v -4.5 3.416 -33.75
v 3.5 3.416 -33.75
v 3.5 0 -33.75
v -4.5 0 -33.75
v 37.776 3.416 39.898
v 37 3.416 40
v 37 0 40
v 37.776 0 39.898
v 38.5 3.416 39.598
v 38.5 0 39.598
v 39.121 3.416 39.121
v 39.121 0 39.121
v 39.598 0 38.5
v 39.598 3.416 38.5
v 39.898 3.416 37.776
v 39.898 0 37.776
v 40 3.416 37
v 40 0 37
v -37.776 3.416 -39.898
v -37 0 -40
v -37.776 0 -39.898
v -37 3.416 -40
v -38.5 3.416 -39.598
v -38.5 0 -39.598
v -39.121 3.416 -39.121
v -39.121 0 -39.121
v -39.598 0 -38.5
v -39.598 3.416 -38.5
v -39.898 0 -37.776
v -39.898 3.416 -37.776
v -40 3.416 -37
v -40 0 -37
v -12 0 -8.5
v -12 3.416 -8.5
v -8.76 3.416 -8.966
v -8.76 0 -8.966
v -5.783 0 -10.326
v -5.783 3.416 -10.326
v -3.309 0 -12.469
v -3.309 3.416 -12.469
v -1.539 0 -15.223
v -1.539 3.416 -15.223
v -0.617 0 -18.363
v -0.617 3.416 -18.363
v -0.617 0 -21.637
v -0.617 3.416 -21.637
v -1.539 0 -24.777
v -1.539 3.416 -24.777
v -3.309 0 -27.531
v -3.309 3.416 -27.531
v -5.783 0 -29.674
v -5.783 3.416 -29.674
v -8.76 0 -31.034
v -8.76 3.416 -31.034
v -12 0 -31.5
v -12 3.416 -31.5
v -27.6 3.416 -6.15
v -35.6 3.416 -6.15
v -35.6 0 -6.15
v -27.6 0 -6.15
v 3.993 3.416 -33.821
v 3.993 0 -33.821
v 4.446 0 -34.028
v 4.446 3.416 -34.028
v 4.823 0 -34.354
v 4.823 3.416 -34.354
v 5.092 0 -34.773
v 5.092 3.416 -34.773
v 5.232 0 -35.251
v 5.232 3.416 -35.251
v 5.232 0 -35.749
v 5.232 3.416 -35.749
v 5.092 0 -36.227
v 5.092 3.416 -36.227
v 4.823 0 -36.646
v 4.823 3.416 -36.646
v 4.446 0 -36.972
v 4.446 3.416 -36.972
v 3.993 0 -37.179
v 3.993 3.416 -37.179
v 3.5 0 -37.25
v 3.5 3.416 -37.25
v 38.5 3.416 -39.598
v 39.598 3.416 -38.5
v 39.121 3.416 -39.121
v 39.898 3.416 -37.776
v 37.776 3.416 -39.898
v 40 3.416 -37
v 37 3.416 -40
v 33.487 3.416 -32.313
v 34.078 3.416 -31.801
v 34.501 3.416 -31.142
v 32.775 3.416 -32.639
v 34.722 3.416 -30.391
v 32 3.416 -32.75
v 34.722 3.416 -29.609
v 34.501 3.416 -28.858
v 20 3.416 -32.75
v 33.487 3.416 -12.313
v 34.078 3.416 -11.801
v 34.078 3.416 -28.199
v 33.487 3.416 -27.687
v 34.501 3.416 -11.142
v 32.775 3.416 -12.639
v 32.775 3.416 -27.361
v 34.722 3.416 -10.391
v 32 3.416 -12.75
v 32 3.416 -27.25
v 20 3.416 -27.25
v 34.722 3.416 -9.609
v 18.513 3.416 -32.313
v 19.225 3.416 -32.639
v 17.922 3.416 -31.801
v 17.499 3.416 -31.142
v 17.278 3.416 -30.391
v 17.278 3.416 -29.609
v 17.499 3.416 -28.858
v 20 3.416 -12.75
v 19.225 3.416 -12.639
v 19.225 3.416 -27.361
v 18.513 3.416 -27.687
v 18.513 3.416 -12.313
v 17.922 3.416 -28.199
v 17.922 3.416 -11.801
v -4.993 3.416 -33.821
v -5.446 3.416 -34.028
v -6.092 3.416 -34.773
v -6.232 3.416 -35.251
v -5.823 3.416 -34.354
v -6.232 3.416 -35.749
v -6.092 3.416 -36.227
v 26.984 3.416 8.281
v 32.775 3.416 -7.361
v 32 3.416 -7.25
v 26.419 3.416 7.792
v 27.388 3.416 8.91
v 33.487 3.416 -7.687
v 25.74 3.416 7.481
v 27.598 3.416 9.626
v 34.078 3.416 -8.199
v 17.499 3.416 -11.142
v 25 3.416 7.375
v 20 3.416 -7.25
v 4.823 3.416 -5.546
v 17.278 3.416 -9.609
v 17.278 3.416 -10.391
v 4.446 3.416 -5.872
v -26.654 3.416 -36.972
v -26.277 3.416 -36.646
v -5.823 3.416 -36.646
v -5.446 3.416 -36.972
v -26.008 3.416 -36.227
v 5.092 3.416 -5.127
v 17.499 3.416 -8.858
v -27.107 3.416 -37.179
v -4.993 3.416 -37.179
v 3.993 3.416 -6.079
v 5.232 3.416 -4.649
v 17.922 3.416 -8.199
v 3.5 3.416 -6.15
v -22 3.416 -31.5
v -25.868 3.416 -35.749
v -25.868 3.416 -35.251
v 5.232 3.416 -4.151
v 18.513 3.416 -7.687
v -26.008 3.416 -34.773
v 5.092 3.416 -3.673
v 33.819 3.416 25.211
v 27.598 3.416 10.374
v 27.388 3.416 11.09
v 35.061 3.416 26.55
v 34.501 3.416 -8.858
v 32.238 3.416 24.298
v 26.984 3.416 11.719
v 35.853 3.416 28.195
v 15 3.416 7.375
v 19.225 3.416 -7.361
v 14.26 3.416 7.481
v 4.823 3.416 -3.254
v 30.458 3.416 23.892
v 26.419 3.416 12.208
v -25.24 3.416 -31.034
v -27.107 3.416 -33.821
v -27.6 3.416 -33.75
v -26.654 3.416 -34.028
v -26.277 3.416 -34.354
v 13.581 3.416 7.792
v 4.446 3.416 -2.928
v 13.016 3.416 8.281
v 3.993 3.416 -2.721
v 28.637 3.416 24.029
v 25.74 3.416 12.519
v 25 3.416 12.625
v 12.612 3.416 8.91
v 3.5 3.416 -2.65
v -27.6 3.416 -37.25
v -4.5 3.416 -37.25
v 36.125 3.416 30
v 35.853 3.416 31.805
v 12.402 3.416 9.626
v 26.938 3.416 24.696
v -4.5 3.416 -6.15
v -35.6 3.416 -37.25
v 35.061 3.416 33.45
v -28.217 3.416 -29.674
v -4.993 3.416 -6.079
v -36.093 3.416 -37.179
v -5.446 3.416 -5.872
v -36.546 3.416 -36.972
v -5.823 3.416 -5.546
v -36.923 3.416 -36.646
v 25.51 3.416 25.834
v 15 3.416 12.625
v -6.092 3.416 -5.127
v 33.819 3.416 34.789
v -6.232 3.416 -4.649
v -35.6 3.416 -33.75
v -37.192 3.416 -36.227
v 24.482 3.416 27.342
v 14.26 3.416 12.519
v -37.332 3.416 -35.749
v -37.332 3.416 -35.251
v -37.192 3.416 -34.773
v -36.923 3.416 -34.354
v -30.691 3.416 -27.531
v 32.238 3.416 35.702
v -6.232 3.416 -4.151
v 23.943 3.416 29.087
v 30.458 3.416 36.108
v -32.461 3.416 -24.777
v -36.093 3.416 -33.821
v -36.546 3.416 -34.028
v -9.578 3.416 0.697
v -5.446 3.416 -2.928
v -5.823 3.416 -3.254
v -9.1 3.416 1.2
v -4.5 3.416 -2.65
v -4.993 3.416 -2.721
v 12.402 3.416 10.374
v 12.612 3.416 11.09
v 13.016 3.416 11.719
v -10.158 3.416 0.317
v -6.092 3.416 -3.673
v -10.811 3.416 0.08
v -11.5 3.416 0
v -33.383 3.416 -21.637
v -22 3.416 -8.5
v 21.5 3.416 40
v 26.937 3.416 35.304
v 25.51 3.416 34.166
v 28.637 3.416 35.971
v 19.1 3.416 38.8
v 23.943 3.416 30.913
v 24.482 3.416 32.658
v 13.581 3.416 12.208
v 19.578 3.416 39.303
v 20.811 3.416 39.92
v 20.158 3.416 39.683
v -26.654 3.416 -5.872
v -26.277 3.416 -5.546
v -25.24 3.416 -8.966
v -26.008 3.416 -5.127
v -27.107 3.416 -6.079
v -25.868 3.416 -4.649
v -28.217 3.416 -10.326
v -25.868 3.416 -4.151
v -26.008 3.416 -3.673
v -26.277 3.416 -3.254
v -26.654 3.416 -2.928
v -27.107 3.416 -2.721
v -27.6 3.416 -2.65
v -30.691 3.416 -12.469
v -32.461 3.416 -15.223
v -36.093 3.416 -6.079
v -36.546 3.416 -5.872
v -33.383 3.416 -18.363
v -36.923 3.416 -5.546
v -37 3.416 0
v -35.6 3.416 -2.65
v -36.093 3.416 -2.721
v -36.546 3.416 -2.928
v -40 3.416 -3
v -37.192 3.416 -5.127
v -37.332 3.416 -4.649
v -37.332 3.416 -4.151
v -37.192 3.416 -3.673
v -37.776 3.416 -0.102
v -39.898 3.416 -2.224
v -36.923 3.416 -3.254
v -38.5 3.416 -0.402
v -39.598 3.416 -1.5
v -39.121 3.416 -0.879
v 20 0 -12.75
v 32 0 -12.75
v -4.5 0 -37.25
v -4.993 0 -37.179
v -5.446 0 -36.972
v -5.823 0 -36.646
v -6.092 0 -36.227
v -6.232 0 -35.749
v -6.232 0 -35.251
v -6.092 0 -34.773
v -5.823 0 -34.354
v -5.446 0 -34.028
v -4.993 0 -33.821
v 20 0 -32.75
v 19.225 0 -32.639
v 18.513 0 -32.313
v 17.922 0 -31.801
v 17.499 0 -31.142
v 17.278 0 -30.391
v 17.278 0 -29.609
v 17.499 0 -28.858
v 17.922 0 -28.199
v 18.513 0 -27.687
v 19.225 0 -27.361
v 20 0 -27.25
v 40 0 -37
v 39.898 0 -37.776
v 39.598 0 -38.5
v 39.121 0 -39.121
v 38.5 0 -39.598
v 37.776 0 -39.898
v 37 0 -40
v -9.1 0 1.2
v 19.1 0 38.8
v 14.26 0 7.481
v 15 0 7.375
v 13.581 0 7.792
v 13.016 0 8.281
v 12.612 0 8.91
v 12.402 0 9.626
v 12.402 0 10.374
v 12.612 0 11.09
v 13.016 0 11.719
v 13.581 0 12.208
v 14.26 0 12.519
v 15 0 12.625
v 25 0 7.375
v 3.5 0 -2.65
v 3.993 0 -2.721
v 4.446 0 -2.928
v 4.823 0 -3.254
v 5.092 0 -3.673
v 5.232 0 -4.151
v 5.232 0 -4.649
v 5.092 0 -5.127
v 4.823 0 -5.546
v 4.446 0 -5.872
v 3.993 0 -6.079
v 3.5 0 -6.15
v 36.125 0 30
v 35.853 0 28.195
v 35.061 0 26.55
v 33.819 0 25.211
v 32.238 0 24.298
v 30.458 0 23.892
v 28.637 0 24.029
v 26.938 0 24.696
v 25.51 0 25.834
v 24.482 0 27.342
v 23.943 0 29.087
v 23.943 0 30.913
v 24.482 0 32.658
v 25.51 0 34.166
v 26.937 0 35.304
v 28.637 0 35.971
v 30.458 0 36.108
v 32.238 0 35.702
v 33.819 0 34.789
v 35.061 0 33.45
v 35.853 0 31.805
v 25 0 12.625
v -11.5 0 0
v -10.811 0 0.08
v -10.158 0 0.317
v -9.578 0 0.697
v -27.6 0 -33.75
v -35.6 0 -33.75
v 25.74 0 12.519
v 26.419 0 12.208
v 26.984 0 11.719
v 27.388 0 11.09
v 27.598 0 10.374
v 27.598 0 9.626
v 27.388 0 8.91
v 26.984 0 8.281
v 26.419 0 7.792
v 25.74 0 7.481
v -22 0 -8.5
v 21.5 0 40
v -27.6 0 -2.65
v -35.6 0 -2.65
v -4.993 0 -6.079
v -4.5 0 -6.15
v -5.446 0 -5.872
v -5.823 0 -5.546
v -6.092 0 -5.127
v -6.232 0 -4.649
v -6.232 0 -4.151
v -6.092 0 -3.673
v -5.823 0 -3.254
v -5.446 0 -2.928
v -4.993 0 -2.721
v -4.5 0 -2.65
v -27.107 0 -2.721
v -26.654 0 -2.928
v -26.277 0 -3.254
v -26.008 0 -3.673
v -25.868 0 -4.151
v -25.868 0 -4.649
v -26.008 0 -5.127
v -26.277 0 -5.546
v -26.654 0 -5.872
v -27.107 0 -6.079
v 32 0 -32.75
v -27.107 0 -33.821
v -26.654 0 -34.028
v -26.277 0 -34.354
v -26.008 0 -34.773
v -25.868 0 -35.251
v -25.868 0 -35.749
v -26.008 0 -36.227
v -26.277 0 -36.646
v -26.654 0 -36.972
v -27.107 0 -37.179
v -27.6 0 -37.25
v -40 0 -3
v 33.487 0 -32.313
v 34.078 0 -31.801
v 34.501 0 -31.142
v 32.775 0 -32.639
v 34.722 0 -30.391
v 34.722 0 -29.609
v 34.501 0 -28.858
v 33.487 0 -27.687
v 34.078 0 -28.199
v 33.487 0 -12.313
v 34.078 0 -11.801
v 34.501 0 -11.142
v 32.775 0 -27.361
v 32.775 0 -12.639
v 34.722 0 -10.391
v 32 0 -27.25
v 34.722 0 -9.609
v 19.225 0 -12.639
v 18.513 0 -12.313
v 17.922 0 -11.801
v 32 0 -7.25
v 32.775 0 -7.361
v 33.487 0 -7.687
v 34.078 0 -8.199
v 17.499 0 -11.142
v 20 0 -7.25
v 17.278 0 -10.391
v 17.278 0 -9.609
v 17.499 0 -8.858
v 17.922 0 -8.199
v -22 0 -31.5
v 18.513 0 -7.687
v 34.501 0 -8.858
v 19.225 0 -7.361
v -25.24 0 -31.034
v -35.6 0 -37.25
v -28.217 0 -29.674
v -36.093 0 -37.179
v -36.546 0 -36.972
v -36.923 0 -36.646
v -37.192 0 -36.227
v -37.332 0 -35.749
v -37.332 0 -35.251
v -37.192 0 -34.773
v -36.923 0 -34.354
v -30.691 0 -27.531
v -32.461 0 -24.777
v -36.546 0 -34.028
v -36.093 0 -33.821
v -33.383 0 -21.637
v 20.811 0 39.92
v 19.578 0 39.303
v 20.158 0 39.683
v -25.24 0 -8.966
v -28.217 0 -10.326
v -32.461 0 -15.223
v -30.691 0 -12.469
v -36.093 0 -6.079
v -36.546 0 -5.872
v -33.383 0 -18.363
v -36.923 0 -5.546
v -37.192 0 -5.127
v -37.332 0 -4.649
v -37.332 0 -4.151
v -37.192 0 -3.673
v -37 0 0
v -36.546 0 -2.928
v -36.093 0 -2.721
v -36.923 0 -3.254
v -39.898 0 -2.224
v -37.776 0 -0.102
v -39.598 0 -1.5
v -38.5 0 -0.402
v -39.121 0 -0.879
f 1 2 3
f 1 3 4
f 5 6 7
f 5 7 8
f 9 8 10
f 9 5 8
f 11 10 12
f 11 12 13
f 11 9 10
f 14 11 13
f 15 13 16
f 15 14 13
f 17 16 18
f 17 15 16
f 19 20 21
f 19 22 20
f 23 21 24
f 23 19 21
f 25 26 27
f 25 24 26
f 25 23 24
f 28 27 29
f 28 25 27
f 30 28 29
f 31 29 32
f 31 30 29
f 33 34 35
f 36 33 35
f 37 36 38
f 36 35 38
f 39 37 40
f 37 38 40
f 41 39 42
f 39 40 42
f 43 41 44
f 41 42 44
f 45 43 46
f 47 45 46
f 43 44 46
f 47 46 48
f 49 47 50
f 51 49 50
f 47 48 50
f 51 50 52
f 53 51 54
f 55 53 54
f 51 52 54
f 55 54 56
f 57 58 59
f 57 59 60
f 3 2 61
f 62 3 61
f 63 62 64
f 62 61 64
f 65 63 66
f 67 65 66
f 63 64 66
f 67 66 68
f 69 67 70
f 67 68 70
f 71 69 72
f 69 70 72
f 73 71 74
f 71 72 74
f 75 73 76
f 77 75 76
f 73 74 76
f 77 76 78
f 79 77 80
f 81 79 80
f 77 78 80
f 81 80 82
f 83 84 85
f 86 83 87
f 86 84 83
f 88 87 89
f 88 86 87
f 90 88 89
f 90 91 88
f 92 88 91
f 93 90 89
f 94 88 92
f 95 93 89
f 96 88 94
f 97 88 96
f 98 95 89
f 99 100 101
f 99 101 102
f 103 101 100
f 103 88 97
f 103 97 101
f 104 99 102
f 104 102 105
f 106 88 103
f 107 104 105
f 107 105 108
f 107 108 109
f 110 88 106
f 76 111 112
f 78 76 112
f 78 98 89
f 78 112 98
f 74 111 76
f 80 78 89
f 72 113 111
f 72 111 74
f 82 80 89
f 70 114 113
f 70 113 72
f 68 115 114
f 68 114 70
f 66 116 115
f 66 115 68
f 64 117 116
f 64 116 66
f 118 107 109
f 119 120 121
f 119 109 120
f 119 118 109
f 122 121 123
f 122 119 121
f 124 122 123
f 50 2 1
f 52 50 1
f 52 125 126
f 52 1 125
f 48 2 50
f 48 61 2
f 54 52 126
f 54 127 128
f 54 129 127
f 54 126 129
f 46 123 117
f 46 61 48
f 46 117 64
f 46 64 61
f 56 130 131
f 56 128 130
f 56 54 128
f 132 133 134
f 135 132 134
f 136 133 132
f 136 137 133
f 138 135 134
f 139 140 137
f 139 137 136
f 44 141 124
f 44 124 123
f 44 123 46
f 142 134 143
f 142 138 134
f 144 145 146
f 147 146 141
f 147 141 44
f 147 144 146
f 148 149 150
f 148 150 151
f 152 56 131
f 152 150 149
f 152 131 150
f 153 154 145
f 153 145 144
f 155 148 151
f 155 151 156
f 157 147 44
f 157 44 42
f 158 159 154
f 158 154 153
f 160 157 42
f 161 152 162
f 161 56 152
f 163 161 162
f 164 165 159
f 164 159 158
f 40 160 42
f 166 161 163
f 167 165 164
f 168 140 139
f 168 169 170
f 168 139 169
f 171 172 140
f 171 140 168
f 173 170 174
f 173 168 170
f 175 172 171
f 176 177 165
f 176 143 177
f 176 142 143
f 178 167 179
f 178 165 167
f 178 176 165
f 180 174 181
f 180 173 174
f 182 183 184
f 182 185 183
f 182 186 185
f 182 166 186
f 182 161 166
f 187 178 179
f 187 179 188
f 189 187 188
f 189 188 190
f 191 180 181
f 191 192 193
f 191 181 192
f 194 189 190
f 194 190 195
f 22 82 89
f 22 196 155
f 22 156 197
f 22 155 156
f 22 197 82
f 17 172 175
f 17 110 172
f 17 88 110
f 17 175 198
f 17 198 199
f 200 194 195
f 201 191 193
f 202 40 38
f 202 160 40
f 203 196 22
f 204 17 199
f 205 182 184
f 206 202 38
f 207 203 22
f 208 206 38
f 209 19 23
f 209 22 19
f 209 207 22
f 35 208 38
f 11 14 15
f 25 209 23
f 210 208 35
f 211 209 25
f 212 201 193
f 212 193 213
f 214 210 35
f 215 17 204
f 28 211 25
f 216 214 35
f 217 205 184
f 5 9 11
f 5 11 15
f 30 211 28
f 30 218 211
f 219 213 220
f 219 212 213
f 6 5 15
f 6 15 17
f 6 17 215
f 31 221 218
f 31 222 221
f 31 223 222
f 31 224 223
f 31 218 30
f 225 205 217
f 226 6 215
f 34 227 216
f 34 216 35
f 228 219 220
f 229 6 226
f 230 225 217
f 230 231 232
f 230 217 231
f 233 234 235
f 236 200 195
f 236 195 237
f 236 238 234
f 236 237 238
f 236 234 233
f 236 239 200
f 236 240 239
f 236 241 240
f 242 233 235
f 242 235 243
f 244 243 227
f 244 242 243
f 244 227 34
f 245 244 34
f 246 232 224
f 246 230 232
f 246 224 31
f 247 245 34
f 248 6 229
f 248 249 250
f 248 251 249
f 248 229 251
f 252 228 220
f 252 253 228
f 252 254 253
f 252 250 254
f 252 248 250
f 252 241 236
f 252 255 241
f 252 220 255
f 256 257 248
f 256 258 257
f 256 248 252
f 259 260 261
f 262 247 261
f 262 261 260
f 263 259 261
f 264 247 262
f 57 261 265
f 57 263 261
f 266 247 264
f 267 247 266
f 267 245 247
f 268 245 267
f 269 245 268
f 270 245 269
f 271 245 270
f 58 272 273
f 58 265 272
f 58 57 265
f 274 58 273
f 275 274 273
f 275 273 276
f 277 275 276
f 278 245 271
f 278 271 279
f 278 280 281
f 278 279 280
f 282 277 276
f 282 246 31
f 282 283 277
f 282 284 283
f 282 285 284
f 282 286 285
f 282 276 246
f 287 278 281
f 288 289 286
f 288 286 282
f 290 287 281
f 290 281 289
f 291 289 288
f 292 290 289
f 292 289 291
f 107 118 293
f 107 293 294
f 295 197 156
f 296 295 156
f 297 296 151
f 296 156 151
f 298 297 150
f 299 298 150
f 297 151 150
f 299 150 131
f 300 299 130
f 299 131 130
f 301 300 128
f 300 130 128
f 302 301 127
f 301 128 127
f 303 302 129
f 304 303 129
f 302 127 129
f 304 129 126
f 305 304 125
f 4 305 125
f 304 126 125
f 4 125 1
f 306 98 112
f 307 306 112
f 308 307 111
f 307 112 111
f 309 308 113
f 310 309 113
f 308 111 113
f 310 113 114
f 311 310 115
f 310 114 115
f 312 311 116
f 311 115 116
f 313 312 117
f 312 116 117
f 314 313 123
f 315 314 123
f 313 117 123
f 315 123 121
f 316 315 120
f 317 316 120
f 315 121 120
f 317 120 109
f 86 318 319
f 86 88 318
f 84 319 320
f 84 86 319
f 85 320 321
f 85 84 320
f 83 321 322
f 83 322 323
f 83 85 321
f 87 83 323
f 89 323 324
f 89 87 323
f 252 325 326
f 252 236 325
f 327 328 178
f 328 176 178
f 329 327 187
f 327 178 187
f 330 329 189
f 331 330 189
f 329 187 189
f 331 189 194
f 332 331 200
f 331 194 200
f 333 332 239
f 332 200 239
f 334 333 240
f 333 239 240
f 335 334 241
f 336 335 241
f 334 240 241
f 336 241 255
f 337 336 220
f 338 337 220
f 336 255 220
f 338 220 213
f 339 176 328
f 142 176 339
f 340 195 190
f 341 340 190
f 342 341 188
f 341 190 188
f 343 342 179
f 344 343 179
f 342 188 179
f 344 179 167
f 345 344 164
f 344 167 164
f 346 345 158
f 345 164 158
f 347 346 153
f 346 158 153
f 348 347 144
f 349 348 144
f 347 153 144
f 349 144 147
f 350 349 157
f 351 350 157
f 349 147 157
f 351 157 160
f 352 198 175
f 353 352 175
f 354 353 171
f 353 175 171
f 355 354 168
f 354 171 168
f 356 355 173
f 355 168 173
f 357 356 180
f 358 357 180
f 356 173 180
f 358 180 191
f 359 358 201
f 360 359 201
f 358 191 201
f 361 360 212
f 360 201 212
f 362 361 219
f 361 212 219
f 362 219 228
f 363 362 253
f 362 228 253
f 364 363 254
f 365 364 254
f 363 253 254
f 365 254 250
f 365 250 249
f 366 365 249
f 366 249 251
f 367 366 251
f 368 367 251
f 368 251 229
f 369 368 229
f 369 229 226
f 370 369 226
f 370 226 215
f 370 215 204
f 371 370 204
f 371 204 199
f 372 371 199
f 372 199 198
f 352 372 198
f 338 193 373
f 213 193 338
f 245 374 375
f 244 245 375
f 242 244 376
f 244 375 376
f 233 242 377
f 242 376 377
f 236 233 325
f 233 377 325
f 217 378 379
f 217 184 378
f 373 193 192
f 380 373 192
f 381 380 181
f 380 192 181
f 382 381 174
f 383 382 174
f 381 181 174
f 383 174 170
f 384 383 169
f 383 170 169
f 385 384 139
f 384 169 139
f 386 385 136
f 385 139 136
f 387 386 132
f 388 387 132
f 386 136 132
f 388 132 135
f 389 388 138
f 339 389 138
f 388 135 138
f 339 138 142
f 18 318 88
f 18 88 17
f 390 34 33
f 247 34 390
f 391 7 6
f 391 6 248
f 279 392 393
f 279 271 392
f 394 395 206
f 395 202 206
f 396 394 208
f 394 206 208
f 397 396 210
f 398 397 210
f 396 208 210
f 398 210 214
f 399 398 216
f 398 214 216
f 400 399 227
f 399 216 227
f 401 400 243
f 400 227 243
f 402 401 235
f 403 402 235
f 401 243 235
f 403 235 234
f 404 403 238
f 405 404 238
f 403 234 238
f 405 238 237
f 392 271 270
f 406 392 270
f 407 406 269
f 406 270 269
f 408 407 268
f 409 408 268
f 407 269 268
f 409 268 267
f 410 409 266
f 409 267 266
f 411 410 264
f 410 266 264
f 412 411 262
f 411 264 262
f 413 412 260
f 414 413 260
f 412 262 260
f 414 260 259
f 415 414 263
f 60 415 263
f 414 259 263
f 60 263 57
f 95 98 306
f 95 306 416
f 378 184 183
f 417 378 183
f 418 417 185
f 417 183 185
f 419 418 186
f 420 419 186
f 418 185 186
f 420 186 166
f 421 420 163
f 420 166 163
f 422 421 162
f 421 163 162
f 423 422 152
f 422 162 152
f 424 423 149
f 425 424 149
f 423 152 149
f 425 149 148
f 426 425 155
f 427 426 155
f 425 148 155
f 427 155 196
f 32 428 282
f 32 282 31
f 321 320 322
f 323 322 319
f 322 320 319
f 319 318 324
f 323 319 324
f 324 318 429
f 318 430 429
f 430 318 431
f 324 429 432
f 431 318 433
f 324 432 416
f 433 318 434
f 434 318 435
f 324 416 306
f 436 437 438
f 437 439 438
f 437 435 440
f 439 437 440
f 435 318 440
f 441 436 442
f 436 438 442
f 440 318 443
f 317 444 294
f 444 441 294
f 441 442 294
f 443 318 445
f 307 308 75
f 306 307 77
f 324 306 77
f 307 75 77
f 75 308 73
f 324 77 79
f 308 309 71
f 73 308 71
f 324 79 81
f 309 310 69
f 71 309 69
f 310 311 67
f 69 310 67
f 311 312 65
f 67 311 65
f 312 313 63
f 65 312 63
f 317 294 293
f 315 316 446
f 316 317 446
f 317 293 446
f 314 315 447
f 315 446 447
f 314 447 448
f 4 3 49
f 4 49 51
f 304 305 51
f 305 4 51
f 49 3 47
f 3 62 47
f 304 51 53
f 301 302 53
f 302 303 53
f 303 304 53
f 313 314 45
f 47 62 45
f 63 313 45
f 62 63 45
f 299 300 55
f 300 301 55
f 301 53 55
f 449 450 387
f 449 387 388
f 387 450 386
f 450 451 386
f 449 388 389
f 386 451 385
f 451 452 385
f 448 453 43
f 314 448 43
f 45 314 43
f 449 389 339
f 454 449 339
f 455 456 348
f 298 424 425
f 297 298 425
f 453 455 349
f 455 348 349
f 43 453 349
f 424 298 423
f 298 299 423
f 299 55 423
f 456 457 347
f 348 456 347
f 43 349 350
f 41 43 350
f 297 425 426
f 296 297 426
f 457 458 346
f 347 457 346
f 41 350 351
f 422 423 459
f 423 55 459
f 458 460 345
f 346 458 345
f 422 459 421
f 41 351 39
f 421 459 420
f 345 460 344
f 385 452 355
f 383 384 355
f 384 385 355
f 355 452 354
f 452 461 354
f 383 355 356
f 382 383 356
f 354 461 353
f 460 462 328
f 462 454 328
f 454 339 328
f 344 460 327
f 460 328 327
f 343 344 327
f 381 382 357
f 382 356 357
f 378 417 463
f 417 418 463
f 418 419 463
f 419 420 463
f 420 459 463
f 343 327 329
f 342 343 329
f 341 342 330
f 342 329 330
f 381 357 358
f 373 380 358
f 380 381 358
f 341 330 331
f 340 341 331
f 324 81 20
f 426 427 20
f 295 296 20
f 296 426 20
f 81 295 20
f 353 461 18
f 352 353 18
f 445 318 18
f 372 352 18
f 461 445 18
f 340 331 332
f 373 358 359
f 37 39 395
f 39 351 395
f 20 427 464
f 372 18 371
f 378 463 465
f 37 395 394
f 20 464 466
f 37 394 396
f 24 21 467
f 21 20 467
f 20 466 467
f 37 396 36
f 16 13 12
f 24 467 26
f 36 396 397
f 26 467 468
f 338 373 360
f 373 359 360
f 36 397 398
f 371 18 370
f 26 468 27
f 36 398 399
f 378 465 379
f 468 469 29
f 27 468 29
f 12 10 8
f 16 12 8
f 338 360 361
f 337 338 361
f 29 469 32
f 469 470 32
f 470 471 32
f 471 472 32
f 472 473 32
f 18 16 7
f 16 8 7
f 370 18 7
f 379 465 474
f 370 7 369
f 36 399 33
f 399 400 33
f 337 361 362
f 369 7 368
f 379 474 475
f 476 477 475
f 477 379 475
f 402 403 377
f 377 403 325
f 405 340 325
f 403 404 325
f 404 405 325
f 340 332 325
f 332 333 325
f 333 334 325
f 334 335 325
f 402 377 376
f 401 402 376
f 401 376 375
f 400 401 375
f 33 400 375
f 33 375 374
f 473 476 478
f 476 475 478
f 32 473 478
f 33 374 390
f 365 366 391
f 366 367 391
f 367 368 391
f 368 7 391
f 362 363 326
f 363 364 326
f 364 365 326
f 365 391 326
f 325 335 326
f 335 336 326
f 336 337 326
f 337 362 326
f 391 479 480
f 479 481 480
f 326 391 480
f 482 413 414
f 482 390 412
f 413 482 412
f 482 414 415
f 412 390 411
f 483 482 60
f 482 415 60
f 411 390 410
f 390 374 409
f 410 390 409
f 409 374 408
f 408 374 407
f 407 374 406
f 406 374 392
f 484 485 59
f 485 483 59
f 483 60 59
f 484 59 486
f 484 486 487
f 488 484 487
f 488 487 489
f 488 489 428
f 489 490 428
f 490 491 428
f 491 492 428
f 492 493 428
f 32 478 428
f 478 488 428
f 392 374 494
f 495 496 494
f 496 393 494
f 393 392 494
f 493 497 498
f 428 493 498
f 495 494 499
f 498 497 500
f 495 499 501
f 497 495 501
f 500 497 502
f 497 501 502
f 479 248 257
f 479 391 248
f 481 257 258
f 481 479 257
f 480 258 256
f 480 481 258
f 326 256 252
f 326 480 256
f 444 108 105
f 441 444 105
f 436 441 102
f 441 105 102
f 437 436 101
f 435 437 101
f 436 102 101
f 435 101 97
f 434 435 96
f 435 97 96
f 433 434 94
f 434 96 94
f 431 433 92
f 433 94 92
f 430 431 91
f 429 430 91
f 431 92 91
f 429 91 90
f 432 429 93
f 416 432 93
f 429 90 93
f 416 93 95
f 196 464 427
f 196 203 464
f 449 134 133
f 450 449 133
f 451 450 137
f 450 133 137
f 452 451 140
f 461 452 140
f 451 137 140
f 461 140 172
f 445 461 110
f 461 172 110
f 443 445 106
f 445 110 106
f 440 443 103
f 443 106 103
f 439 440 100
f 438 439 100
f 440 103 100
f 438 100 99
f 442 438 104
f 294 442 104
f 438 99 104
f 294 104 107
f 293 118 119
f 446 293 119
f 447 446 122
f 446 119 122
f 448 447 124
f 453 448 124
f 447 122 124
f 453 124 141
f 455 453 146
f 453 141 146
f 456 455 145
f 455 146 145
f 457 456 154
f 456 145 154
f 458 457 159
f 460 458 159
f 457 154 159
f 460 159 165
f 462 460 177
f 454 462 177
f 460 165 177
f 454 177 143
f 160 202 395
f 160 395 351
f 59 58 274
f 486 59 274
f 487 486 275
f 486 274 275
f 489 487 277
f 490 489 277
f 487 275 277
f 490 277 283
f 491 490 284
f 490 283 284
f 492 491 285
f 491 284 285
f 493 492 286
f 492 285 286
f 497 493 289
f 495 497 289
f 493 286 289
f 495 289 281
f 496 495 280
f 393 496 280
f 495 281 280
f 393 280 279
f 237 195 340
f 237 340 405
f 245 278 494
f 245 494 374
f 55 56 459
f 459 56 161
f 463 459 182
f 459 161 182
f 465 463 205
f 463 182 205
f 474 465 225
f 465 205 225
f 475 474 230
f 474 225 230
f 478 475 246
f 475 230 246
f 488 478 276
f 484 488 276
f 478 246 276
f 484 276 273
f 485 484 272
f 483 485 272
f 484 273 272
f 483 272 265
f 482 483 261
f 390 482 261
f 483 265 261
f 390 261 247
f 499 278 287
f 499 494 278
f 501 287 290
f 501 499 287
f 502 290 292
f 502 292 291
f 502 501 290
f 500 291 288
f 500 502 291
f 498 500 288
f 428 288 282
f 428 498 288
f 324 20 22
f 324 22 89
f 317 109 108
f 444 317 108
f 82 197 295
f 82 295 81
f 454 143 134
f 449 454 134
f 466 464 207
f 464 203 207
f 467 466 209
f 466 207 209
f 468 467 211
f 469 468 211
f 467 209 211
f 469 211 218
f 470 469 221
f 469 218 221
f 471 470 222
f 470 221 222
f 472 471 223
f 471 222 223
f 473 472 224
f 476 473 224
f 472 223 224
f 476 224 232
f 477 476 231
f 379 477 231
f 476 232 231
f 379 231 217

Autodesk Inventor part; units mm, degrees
ref_plane "YZ Plane" through (0, 0, 0) normal (1, 0, 0) x (0, 1, 0)
ref_plane "XZ Plane" through (0, 0, 0) normal (0, 1, 0) x (-1, 0, 0)
ref_plane "XY Plane" through (0, 0, 0) normal (0, 0, 1) x (1, 0, 0)
sketch "Sketch1" plane through (0, 0, 0) normal (0, 1, 0) x (-1, 0, 0)
  line L0 (-40, 40) -> (40, 40)
  line L1 (40, 40) -> (40, -40)
  line L2 (40, -40) -> (-40, -40)
  line L3 (-40, -40) -> (-40, 40)
  point P0 (0, 0)
  dimension "d0" = 80
  dimension "d1" = 80
  dimension "d2" = 40
  dimension "d3" = 40
extrude "Extrusion1" add sketch "Sketch1" along normal blind 3.4163
sketch "Sketch2" plane through (0, 3.4163, 0) normal (0, 1, 0) x (1, 0, 0)
  line L0 (40, -40) -> (40, 40) projected
  line L1 (40, 40) -> (-40, 40) projected
  arc A0 (20, 32.75) -> (20, 27.25) centre (20, 30) ccw
  arc A1 (20, 12.75) -> (20, 7.25) centre (20, 10) ccw
  line L2 (20, 32.75) -> (32, 32.75)
  line L3 (20, 27.25) -> (32, 27.25)
  line L4 (20, 12.75) -> (32, 12.75)
  line L5 (20, 7.25) -> (32, 7.25)
  arc A2 (32, 27.25) -> (32, 32.75) centre (32, 30) ccw
  arc A3 (32, 7.25) -> (32, 12.75) centre (32, 10) ccw
  point P0 (0, 0)
  point P1 (40, 32.75)
  point P2 (40, 27.25)
  point P3 (40, 12.75)
  point P4 (40, 7.25)
  dimension "d6" = 5.5
  dimension "d7" = 5.5
  dimension "d8" = 20
  dimension "d9" = 10
  dimension "d10" = 20
  dimension "d11" = 20
  dimension "d72" = 5.5
  dimension "d73" = 10
  dimension "d74" = 8
  dimension "d75" = 5.5
  dimension "d76" = 20
  dimension "d77" = 8
extrude "Extrusion2" cut sketch "Sketch2" against normal through all
sketch "Sketch3" plane through (0, 3.4163, 0) normal (0, 1, 0) x (1, 0, 0)
  line L0 (40, 40) -> (-40, 40) projected
  line L1 (40, -40) -> (40, 40) projected
  circle A0 centre (30, -30) radius 6.125
  point P0 (40, 7.25)
  point P1 (0, 0)
  dimension "d14" = 12.25
  dimension "d15" = 10
  dimension "d16" = 70
extrude "Extrusion3" cut sketch "Sketch3" against normal through all
sketch "Sketch4" plane through (0, 3.4163, 0) normal (0, 1, 0) x (1, 0, 0)
  line L0 (40, 40) -> (-40, 40) projected
  line L1 (-40, 40) -> (-40, -40) projected
  line L2 (-40, -40) -> (40, -40) projected
  line L3 (32, 27.25) -> (20, 27.25) projected
  line L4 (-40, 0) -> (-10, 0)
  line L5 (-10, 0) -> (20, -40)
  point P0 (40, 27.25)
  point P1 (0, 0)
  dimension "d19" = 30
  dimension "d21" = 40
  dimension "d22" = 60
extrude "Extrusion4" cut sketch "Sketch4" against normal through all
fillet "Fillet1" radius 3 6 edges at (40, 1.7082, 40) (20, 1.7082, 40) (40, 1.7082, -40) (-10, 1.7082, 0) (-40, 1.7082, 0) (-40, 1.7082, -40)
sketch "Sketch5" plane through (0, 3.4163, 0) normal (0, 1, 0) x (1, 0, 0)
  line L0 (40, -37) -> (40, 37) projected
  line L1 (37, 40) -> (-37, 40) projected
  arc A0 (-12, 8.5) -> (-12, 31.5) centre (-12, 20) ccw
  line L2 (-12, 31.5) -> (-22, 31.5)
  line L3 (-12, 8.5) -> (-22, 8.5)
  arc A1 (-22, 31.5) -> (-22, 8.5) centre (-22, 20) ccw
  point P0 (40, 15.75)
  point P1 (40, 24.25)
  point P2 (0, 0)
  dimension "d26" = 23
  dimension "d27" = 52
  dimension "d35" = 23
  dimension "d36" = 10
  dimension "d37" = 10
  dimension "d38" = 20
  dimension "d39" = 20
  dimension "d42" = 52
  dimension "d81" = 8.5
  dimension "d82" = 8.5
extrude "Extrusion5" cut sketch "Sketch5" against normal through all
sketch "Sketch6" plane through (0, 3.4163, 0) normal (0, 1, 0) x (1, 0, 0)
  line L0 (40, -37) -> (40, 37) projected
  line L1 (37, 40) -> (-37, 40) projected
  arc A0 (3.5, 33.75) -> (3.5, 37.25) centre (3.5, 35.5) ccw
  arc A1 (-4.5, 37.25) -> (-4.5, 33.75) centre (-4.5, 35.5) ccw
  line L2 (-4.5, 37.25) -> (3.5, 37.25)
  line L3 (3.5, 33.75) -> (-4.5, 33.75)
  point P0 (40, 35.75)
  point P1 (0, 0)
  dimension "d48" = 3.5
  dimension "d49" = 4.5
  dimension "d50" = 36.5
  dimension "d51" = 3.5
  dimension "d52" = 4.5
  dimension "d53" = 44.5
  dimension "d78" = 8
extrude "Extrusion6" cut sketch "Sketch6" against normal through all
pattern_linear "Rectangular Pattern1" count 2 spacing 31.1 along (-1, 0, 0) count 2 spacing 31.1 along (0, 0, 1) of "Extrusion6"
sketch "Sketch7" plane through (0, 3.4163, 0) normal (0, 1, 0) x (1, 0, 0)
  line L0 (21.5, -40) -> (37, -40) projected
  line L1 (40, -37) -> (40, 37) projected
  arc A0 (25, -12.625) -> (25, -7.375) centre (25, -10) ccw
  arc A1 (15, -7.375) -> (15, -12.625) centre (15, -10) ccw
  line L2 (15, -7.375) -> (25, -7.375)
  line L3 (25, -12.625) -> (15, -12.625)
  point P0 (40, 4.25)
  point P1 (0, 0)
  dimension "d63" = 5.25
  dimension "d64" = 15
  dimension "d65" = 30
  dimension "d66" = 5.25
  dimension "d67" = 10
  dimension "d68" = 30
  dimension "d69" = 10
extrude "Extrusion7" cut sketch "Sketch7" against normal through all
equation "\"d73\" = d9"
equation "\"d76\" = d8"
equation "\"d77\" = d74"
equation "\"d35\" = d26"
equation "\"d42\" = d27"
equation "\"d66\" = d63"
properties part number "z_motor_mount_plate"
